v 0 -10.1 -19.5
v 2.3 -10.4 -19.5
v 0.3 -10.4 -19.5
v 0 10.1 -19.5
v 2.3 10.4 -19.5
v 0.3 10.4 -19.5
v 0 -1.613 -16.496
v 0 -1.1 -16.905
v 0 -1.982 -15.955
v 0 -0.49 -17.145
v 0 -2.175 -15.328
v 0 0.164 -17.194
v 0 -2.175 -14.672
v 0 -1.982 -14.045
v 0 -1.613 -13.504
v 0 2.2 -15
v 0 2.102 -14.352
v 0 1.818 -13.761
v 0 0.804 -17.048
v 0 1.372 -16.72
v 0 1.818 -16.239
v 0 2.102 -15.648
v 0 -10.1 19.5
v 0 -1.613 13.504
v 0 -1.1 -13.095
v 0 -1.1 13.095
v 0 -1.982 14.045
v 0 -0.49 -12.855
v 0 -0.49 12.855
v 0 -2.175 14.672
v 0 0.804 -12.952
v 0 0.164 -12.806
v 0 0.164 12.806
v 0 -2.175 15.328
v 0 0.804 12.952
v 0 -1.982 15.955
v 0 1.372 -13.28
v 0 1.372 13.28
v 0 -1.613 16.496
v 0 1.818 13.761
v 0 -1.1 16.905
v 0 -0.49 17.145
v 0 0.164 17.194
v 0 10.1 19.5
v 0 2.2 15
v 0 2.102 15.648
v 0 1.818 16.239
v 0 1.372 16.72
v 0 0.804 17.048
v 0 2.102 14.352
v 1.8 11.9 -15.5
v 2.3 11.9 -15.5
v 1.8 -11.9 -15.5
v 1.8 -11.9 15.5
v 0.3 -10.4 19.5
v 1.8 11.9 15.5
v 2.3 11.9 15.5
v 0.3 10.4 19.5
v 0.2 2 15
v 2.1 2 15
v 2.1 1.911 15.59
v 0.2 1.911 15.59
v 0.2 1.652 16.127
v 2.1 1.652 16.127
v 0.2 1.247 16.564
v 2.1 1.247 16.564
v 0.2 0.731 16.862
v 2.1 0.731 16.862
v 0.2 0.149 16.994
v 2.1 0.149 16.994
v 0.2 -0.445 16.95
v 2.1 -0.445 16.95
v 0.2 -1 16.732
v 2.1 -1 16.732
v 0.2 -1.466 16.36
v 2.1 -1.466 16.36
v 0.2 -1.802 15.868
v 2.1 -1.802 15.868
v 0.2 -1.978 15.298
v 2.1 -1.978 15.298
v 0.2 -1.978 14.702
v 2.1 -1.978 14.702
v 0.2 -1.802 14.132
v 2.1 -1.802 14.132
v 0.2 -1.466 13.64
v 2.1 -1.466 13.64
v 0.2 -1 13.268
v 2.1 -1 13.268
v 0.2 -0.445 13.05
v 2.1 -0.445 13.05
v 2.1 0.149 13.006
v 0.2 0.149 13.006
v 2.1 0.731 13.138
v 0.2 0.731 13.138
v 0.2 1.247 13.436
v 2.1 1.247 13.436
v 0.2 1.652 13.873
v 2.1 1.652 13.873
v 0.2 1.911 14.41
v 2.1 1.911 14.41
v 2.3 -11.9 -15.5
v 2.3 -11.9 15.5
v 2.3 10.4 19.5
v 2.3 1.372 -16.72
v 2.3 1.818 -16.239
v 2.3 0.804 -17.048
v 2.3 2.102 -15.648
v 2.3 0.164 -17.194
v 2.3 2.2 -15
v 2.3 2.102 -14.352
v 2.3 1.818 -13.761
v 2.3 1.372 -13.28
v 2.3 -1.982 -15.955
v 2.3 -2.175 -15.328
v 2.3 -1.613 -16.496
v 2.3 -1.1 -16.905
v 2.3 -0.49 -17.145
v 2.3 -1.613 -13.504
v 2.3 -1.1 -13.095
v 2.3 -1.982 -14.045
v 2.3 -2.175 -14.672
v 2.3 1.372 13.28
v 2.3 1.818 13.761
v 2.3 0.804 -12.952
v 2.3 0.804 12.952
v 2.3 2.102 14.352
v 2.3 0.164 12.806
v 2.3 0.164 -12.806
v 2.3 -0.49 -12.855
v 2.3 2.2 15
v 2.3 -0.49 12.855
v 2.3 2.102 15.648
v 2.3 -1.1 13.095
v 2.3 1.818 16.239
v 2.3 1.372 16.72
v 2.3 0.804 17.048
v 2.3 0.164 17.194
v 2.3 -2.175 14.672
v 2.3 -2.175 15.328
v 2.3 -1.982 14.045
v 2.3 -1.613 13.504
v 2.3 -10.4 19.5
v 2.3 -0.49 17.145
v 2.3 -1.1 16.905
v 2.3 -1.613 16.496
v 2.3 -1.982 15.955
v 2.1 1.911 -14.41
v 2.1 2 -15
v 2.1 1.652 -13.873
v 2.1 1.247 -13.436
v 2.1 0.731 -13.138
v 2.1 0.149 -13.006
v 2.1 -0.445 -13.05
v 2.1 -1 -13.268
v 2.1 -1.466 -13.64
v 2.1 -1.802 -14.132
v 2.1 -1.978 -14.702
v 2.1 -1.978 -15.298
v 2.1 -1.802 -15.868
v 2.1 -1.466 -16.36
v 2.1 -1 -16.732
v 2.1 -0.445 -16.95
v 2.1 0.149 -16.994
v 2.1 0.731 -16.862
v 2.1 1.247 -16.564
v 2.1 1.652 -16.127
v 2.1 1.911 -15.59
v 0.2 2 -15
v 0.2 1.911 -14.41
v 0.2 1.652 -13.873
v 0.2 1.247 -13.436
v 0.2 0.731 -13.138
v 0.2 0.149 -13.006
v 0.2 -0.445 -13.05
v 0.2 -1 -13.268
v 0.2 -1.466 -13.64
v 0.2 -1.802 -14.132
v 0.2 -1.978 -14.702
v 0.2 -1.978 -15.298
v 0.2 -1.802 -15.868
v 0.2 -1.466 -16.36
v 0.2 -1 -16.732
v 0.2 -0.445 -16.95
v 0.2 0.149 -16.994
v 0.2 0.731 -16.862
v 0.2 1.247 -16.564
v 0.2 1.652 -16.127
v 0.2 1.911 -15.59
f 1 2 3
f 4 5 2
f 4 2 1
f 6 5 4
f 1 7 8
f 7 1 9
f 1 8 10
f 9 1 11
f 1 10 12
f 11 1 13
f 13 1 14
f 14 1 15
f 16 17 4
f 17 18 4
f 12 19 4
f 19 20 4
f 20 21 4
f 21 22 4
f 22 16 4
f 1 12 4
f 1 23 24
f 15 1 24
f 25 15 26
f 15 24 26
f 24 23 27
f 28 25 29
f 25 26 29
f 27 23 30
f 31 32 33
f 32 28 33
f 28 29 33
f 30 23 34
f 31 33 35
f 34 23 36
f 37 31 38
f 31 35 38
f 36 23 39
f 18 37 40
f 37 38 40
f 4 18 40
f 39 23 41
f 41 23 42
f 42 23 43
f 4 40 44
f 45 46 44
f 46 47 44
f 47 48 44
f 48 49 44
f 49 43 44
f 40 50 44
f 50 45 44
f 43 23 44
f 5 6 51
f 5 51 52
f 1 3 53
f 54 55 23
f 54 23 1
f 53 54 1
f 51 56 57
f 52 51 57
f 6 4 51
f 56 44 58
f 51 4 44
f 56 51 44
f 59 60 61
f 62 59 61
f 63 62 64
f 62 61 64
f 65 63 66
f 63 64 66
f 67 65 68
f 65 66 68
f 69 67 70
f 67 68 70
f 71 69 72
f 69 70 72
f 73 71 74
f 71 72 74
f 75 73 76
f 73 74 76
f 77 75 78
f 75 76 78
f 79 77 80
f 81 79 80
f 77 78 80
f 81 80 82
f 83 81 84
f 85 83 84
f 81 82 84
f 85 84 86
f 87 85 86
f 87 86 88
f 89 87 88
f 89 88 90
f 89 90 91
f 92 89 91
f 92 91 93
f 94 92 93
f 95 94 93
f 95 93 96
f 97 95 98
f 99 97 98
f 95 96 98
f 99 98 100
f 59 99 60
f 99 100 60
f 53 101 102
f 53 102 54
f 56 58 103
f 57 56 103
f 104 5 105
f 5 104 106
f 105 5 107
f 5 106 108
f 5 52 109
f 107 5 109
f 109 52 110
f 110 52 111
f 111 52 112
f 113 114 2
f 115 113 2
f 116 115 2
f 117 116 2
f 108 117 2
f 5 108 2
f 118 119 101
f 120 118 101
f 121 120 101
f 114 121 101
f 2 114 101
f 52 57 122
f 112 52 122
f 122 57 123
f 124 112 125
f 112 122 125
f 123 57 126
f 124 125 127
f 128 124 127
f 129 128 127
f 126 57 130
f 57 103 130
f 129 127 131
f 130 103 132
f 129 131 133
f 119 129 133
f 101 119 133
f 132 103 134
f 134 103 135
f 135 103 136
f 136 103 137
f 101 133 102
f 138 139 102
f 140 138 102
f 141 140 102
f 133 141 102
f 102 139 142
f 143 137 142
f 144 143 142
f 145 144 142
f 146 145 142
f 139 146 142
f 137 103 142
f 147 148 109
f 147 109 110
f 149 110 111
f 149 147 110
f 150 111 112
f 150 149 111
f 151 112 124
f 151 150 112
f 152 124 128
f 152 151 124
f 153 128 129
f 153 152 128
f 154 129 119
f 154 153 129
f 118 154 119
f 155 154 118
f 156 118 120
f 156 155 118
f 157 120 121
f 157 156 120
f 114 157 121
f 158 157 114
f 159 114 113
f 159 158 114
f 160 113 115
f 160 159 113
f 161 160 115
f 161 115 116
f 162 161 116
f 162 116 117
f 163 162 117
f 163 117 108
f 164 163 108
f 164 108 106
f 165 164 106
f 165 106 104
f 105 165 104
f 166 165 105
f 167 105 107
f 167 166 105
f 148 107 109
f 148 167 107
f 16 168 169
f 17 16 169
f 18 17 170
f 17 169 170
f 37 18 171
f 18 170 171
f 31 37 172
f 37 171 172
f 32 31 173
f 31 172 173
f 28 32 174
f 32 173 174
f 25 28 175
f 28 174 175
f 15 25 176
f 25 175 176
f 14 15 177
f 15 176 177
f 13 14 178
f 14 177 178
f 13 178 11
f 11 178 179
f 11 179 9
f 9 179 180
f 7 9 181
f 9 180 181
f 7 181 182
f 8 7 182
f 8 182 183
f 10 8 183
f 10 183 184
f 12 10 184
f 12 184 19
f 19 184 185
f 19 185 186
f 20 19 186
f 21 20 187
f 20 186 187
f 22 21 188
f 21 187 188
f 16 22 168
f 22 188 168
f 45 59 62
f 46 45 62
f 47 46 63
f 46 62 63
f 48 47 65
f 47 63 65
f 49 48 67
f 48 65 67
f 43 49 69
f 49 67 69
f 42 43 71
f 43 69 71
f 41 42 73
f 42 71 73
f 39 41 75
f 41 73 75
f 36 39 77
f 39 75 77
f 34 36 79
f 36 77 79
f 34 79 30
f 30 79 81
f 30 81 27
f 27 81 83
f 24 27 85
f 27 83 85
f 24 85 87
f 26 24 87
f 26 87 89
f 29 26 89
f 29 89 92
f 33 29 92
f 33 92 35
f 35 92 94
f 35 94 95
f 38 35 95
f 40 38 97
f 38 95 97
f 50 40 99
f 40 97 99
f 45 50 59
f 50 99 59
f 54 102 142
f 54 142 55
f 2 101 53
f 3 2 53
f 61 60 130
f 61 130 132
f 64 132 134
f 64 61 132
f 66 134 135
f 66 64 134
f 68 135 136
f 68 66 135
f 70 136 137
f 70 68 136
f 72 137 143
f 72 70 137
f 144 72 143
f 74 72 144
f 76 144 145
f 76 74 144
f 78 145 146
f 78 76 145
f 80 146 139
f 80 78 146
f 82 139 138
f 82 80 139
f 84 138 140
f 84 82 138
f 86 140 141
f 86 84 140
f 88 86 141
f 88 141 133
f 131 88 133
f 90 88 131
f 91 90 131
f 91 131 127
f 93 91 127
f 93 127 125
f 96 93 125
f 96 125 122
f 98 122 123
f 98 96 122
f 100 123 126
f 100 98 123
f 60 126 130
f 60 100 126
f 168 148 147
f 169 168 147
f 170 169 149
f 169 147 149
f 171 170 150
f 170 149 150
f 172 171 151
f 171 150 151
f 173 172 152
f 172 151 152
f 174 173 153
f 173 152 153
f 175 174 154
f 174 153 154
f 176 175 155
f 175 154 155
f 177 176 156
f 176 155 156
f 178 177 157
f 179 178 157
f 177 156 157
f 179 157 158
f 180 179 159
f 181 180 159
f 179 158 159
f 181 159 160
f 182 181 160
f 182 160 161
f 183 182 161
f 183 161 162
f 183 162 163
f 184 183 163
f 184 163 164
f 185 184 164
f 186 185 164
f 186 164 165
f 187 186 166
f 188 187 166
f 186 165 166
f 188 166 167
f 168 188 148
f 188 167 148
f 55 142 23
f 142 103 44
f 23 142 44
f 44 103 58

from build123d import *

# Parameters (mm, degrees)
PAD011_DEPTH       = 19.5
SKETCH016_R        = 2
POCKET003_DEPTH    = 2.3
CHAMFER006_1_SIZE2 = 4
CHAMFER006_1_SIZE  = 1.5
CHAMFER006_2_SIZE2 = 4
CHAMFER006_2_SIZE  = 1.5
CHAMFER007_SIZE    = 0.2


with BuildPart() as part:
    # Sketch015 → Pad011 (new body, symmetric)
    with BuildSketch(Plane.XY):
        Polygon((0, -10.1), (0, 10.1), (1.8, 11.9), (2.3, 11.9), (2.3, -11.9), (1.8, -11.9), align=None)
    extrude(amount=PAD011_DEPTH, both=True)

    # Sketch016 (on Face4 of Pad011) → Pocket003 (cut)
    with BuildSketch(Plane.YZ.offset(2.3)):
        with Locations((0, 15)):
            Circle(SKETCH016_R)
        with Locations((0, -15)):
            Circle(SKETCH016_R)
    extrude(amount=-POCKET003_DEPTH, mode=Mode.SUBTRACT)

    # Chamfer006 1
    chamfer006_1_edges = [part.edges().sort_by_distance(p)[0] for p in [
        (2.05, -11.9, -19.5),
        (2.05, 11.9, -19.5),
    ]]
    chamfer006_1_side = part.faces().sort_by_distance((1.184602, 0, -19.5))[0]
    chamfer(chamfer006_1_edges, length=CHAMFER006_1_SIZE, length2=CHAMFER006_1_SIZE2, reference=chamfer006_1_side)

    # Chamfer006 2
    chamfer006_2_edges = [part.edges().sort_by_distance(p)[0] for p in [
        (2.05, -11.9, 19.5),
        (2.05, 11.9, 19.5),
    ]]
    chamfer006_2_side = part.faces().sort_by_distance((1.184602, 0, 19.5))[0]
    chamfer(chamfer006_2_edges, length=CHAMFER006_2_SIZE, length2=CHAMFER006_2_SIZE2, reference=chamfer006_2_side)

    # Chamfer007
    chamfer007_edges = [part.edges().sort_by_distance(p)[0] for p in [
        (2.3, -2, -15),
        (0, -2, -15),
        (2.3, -2, 15),
        (0, -2, 15),
    ]]
    chamfer(chamfer007_edges, length=CHAMFER007_SIZE)


solid = part.part
